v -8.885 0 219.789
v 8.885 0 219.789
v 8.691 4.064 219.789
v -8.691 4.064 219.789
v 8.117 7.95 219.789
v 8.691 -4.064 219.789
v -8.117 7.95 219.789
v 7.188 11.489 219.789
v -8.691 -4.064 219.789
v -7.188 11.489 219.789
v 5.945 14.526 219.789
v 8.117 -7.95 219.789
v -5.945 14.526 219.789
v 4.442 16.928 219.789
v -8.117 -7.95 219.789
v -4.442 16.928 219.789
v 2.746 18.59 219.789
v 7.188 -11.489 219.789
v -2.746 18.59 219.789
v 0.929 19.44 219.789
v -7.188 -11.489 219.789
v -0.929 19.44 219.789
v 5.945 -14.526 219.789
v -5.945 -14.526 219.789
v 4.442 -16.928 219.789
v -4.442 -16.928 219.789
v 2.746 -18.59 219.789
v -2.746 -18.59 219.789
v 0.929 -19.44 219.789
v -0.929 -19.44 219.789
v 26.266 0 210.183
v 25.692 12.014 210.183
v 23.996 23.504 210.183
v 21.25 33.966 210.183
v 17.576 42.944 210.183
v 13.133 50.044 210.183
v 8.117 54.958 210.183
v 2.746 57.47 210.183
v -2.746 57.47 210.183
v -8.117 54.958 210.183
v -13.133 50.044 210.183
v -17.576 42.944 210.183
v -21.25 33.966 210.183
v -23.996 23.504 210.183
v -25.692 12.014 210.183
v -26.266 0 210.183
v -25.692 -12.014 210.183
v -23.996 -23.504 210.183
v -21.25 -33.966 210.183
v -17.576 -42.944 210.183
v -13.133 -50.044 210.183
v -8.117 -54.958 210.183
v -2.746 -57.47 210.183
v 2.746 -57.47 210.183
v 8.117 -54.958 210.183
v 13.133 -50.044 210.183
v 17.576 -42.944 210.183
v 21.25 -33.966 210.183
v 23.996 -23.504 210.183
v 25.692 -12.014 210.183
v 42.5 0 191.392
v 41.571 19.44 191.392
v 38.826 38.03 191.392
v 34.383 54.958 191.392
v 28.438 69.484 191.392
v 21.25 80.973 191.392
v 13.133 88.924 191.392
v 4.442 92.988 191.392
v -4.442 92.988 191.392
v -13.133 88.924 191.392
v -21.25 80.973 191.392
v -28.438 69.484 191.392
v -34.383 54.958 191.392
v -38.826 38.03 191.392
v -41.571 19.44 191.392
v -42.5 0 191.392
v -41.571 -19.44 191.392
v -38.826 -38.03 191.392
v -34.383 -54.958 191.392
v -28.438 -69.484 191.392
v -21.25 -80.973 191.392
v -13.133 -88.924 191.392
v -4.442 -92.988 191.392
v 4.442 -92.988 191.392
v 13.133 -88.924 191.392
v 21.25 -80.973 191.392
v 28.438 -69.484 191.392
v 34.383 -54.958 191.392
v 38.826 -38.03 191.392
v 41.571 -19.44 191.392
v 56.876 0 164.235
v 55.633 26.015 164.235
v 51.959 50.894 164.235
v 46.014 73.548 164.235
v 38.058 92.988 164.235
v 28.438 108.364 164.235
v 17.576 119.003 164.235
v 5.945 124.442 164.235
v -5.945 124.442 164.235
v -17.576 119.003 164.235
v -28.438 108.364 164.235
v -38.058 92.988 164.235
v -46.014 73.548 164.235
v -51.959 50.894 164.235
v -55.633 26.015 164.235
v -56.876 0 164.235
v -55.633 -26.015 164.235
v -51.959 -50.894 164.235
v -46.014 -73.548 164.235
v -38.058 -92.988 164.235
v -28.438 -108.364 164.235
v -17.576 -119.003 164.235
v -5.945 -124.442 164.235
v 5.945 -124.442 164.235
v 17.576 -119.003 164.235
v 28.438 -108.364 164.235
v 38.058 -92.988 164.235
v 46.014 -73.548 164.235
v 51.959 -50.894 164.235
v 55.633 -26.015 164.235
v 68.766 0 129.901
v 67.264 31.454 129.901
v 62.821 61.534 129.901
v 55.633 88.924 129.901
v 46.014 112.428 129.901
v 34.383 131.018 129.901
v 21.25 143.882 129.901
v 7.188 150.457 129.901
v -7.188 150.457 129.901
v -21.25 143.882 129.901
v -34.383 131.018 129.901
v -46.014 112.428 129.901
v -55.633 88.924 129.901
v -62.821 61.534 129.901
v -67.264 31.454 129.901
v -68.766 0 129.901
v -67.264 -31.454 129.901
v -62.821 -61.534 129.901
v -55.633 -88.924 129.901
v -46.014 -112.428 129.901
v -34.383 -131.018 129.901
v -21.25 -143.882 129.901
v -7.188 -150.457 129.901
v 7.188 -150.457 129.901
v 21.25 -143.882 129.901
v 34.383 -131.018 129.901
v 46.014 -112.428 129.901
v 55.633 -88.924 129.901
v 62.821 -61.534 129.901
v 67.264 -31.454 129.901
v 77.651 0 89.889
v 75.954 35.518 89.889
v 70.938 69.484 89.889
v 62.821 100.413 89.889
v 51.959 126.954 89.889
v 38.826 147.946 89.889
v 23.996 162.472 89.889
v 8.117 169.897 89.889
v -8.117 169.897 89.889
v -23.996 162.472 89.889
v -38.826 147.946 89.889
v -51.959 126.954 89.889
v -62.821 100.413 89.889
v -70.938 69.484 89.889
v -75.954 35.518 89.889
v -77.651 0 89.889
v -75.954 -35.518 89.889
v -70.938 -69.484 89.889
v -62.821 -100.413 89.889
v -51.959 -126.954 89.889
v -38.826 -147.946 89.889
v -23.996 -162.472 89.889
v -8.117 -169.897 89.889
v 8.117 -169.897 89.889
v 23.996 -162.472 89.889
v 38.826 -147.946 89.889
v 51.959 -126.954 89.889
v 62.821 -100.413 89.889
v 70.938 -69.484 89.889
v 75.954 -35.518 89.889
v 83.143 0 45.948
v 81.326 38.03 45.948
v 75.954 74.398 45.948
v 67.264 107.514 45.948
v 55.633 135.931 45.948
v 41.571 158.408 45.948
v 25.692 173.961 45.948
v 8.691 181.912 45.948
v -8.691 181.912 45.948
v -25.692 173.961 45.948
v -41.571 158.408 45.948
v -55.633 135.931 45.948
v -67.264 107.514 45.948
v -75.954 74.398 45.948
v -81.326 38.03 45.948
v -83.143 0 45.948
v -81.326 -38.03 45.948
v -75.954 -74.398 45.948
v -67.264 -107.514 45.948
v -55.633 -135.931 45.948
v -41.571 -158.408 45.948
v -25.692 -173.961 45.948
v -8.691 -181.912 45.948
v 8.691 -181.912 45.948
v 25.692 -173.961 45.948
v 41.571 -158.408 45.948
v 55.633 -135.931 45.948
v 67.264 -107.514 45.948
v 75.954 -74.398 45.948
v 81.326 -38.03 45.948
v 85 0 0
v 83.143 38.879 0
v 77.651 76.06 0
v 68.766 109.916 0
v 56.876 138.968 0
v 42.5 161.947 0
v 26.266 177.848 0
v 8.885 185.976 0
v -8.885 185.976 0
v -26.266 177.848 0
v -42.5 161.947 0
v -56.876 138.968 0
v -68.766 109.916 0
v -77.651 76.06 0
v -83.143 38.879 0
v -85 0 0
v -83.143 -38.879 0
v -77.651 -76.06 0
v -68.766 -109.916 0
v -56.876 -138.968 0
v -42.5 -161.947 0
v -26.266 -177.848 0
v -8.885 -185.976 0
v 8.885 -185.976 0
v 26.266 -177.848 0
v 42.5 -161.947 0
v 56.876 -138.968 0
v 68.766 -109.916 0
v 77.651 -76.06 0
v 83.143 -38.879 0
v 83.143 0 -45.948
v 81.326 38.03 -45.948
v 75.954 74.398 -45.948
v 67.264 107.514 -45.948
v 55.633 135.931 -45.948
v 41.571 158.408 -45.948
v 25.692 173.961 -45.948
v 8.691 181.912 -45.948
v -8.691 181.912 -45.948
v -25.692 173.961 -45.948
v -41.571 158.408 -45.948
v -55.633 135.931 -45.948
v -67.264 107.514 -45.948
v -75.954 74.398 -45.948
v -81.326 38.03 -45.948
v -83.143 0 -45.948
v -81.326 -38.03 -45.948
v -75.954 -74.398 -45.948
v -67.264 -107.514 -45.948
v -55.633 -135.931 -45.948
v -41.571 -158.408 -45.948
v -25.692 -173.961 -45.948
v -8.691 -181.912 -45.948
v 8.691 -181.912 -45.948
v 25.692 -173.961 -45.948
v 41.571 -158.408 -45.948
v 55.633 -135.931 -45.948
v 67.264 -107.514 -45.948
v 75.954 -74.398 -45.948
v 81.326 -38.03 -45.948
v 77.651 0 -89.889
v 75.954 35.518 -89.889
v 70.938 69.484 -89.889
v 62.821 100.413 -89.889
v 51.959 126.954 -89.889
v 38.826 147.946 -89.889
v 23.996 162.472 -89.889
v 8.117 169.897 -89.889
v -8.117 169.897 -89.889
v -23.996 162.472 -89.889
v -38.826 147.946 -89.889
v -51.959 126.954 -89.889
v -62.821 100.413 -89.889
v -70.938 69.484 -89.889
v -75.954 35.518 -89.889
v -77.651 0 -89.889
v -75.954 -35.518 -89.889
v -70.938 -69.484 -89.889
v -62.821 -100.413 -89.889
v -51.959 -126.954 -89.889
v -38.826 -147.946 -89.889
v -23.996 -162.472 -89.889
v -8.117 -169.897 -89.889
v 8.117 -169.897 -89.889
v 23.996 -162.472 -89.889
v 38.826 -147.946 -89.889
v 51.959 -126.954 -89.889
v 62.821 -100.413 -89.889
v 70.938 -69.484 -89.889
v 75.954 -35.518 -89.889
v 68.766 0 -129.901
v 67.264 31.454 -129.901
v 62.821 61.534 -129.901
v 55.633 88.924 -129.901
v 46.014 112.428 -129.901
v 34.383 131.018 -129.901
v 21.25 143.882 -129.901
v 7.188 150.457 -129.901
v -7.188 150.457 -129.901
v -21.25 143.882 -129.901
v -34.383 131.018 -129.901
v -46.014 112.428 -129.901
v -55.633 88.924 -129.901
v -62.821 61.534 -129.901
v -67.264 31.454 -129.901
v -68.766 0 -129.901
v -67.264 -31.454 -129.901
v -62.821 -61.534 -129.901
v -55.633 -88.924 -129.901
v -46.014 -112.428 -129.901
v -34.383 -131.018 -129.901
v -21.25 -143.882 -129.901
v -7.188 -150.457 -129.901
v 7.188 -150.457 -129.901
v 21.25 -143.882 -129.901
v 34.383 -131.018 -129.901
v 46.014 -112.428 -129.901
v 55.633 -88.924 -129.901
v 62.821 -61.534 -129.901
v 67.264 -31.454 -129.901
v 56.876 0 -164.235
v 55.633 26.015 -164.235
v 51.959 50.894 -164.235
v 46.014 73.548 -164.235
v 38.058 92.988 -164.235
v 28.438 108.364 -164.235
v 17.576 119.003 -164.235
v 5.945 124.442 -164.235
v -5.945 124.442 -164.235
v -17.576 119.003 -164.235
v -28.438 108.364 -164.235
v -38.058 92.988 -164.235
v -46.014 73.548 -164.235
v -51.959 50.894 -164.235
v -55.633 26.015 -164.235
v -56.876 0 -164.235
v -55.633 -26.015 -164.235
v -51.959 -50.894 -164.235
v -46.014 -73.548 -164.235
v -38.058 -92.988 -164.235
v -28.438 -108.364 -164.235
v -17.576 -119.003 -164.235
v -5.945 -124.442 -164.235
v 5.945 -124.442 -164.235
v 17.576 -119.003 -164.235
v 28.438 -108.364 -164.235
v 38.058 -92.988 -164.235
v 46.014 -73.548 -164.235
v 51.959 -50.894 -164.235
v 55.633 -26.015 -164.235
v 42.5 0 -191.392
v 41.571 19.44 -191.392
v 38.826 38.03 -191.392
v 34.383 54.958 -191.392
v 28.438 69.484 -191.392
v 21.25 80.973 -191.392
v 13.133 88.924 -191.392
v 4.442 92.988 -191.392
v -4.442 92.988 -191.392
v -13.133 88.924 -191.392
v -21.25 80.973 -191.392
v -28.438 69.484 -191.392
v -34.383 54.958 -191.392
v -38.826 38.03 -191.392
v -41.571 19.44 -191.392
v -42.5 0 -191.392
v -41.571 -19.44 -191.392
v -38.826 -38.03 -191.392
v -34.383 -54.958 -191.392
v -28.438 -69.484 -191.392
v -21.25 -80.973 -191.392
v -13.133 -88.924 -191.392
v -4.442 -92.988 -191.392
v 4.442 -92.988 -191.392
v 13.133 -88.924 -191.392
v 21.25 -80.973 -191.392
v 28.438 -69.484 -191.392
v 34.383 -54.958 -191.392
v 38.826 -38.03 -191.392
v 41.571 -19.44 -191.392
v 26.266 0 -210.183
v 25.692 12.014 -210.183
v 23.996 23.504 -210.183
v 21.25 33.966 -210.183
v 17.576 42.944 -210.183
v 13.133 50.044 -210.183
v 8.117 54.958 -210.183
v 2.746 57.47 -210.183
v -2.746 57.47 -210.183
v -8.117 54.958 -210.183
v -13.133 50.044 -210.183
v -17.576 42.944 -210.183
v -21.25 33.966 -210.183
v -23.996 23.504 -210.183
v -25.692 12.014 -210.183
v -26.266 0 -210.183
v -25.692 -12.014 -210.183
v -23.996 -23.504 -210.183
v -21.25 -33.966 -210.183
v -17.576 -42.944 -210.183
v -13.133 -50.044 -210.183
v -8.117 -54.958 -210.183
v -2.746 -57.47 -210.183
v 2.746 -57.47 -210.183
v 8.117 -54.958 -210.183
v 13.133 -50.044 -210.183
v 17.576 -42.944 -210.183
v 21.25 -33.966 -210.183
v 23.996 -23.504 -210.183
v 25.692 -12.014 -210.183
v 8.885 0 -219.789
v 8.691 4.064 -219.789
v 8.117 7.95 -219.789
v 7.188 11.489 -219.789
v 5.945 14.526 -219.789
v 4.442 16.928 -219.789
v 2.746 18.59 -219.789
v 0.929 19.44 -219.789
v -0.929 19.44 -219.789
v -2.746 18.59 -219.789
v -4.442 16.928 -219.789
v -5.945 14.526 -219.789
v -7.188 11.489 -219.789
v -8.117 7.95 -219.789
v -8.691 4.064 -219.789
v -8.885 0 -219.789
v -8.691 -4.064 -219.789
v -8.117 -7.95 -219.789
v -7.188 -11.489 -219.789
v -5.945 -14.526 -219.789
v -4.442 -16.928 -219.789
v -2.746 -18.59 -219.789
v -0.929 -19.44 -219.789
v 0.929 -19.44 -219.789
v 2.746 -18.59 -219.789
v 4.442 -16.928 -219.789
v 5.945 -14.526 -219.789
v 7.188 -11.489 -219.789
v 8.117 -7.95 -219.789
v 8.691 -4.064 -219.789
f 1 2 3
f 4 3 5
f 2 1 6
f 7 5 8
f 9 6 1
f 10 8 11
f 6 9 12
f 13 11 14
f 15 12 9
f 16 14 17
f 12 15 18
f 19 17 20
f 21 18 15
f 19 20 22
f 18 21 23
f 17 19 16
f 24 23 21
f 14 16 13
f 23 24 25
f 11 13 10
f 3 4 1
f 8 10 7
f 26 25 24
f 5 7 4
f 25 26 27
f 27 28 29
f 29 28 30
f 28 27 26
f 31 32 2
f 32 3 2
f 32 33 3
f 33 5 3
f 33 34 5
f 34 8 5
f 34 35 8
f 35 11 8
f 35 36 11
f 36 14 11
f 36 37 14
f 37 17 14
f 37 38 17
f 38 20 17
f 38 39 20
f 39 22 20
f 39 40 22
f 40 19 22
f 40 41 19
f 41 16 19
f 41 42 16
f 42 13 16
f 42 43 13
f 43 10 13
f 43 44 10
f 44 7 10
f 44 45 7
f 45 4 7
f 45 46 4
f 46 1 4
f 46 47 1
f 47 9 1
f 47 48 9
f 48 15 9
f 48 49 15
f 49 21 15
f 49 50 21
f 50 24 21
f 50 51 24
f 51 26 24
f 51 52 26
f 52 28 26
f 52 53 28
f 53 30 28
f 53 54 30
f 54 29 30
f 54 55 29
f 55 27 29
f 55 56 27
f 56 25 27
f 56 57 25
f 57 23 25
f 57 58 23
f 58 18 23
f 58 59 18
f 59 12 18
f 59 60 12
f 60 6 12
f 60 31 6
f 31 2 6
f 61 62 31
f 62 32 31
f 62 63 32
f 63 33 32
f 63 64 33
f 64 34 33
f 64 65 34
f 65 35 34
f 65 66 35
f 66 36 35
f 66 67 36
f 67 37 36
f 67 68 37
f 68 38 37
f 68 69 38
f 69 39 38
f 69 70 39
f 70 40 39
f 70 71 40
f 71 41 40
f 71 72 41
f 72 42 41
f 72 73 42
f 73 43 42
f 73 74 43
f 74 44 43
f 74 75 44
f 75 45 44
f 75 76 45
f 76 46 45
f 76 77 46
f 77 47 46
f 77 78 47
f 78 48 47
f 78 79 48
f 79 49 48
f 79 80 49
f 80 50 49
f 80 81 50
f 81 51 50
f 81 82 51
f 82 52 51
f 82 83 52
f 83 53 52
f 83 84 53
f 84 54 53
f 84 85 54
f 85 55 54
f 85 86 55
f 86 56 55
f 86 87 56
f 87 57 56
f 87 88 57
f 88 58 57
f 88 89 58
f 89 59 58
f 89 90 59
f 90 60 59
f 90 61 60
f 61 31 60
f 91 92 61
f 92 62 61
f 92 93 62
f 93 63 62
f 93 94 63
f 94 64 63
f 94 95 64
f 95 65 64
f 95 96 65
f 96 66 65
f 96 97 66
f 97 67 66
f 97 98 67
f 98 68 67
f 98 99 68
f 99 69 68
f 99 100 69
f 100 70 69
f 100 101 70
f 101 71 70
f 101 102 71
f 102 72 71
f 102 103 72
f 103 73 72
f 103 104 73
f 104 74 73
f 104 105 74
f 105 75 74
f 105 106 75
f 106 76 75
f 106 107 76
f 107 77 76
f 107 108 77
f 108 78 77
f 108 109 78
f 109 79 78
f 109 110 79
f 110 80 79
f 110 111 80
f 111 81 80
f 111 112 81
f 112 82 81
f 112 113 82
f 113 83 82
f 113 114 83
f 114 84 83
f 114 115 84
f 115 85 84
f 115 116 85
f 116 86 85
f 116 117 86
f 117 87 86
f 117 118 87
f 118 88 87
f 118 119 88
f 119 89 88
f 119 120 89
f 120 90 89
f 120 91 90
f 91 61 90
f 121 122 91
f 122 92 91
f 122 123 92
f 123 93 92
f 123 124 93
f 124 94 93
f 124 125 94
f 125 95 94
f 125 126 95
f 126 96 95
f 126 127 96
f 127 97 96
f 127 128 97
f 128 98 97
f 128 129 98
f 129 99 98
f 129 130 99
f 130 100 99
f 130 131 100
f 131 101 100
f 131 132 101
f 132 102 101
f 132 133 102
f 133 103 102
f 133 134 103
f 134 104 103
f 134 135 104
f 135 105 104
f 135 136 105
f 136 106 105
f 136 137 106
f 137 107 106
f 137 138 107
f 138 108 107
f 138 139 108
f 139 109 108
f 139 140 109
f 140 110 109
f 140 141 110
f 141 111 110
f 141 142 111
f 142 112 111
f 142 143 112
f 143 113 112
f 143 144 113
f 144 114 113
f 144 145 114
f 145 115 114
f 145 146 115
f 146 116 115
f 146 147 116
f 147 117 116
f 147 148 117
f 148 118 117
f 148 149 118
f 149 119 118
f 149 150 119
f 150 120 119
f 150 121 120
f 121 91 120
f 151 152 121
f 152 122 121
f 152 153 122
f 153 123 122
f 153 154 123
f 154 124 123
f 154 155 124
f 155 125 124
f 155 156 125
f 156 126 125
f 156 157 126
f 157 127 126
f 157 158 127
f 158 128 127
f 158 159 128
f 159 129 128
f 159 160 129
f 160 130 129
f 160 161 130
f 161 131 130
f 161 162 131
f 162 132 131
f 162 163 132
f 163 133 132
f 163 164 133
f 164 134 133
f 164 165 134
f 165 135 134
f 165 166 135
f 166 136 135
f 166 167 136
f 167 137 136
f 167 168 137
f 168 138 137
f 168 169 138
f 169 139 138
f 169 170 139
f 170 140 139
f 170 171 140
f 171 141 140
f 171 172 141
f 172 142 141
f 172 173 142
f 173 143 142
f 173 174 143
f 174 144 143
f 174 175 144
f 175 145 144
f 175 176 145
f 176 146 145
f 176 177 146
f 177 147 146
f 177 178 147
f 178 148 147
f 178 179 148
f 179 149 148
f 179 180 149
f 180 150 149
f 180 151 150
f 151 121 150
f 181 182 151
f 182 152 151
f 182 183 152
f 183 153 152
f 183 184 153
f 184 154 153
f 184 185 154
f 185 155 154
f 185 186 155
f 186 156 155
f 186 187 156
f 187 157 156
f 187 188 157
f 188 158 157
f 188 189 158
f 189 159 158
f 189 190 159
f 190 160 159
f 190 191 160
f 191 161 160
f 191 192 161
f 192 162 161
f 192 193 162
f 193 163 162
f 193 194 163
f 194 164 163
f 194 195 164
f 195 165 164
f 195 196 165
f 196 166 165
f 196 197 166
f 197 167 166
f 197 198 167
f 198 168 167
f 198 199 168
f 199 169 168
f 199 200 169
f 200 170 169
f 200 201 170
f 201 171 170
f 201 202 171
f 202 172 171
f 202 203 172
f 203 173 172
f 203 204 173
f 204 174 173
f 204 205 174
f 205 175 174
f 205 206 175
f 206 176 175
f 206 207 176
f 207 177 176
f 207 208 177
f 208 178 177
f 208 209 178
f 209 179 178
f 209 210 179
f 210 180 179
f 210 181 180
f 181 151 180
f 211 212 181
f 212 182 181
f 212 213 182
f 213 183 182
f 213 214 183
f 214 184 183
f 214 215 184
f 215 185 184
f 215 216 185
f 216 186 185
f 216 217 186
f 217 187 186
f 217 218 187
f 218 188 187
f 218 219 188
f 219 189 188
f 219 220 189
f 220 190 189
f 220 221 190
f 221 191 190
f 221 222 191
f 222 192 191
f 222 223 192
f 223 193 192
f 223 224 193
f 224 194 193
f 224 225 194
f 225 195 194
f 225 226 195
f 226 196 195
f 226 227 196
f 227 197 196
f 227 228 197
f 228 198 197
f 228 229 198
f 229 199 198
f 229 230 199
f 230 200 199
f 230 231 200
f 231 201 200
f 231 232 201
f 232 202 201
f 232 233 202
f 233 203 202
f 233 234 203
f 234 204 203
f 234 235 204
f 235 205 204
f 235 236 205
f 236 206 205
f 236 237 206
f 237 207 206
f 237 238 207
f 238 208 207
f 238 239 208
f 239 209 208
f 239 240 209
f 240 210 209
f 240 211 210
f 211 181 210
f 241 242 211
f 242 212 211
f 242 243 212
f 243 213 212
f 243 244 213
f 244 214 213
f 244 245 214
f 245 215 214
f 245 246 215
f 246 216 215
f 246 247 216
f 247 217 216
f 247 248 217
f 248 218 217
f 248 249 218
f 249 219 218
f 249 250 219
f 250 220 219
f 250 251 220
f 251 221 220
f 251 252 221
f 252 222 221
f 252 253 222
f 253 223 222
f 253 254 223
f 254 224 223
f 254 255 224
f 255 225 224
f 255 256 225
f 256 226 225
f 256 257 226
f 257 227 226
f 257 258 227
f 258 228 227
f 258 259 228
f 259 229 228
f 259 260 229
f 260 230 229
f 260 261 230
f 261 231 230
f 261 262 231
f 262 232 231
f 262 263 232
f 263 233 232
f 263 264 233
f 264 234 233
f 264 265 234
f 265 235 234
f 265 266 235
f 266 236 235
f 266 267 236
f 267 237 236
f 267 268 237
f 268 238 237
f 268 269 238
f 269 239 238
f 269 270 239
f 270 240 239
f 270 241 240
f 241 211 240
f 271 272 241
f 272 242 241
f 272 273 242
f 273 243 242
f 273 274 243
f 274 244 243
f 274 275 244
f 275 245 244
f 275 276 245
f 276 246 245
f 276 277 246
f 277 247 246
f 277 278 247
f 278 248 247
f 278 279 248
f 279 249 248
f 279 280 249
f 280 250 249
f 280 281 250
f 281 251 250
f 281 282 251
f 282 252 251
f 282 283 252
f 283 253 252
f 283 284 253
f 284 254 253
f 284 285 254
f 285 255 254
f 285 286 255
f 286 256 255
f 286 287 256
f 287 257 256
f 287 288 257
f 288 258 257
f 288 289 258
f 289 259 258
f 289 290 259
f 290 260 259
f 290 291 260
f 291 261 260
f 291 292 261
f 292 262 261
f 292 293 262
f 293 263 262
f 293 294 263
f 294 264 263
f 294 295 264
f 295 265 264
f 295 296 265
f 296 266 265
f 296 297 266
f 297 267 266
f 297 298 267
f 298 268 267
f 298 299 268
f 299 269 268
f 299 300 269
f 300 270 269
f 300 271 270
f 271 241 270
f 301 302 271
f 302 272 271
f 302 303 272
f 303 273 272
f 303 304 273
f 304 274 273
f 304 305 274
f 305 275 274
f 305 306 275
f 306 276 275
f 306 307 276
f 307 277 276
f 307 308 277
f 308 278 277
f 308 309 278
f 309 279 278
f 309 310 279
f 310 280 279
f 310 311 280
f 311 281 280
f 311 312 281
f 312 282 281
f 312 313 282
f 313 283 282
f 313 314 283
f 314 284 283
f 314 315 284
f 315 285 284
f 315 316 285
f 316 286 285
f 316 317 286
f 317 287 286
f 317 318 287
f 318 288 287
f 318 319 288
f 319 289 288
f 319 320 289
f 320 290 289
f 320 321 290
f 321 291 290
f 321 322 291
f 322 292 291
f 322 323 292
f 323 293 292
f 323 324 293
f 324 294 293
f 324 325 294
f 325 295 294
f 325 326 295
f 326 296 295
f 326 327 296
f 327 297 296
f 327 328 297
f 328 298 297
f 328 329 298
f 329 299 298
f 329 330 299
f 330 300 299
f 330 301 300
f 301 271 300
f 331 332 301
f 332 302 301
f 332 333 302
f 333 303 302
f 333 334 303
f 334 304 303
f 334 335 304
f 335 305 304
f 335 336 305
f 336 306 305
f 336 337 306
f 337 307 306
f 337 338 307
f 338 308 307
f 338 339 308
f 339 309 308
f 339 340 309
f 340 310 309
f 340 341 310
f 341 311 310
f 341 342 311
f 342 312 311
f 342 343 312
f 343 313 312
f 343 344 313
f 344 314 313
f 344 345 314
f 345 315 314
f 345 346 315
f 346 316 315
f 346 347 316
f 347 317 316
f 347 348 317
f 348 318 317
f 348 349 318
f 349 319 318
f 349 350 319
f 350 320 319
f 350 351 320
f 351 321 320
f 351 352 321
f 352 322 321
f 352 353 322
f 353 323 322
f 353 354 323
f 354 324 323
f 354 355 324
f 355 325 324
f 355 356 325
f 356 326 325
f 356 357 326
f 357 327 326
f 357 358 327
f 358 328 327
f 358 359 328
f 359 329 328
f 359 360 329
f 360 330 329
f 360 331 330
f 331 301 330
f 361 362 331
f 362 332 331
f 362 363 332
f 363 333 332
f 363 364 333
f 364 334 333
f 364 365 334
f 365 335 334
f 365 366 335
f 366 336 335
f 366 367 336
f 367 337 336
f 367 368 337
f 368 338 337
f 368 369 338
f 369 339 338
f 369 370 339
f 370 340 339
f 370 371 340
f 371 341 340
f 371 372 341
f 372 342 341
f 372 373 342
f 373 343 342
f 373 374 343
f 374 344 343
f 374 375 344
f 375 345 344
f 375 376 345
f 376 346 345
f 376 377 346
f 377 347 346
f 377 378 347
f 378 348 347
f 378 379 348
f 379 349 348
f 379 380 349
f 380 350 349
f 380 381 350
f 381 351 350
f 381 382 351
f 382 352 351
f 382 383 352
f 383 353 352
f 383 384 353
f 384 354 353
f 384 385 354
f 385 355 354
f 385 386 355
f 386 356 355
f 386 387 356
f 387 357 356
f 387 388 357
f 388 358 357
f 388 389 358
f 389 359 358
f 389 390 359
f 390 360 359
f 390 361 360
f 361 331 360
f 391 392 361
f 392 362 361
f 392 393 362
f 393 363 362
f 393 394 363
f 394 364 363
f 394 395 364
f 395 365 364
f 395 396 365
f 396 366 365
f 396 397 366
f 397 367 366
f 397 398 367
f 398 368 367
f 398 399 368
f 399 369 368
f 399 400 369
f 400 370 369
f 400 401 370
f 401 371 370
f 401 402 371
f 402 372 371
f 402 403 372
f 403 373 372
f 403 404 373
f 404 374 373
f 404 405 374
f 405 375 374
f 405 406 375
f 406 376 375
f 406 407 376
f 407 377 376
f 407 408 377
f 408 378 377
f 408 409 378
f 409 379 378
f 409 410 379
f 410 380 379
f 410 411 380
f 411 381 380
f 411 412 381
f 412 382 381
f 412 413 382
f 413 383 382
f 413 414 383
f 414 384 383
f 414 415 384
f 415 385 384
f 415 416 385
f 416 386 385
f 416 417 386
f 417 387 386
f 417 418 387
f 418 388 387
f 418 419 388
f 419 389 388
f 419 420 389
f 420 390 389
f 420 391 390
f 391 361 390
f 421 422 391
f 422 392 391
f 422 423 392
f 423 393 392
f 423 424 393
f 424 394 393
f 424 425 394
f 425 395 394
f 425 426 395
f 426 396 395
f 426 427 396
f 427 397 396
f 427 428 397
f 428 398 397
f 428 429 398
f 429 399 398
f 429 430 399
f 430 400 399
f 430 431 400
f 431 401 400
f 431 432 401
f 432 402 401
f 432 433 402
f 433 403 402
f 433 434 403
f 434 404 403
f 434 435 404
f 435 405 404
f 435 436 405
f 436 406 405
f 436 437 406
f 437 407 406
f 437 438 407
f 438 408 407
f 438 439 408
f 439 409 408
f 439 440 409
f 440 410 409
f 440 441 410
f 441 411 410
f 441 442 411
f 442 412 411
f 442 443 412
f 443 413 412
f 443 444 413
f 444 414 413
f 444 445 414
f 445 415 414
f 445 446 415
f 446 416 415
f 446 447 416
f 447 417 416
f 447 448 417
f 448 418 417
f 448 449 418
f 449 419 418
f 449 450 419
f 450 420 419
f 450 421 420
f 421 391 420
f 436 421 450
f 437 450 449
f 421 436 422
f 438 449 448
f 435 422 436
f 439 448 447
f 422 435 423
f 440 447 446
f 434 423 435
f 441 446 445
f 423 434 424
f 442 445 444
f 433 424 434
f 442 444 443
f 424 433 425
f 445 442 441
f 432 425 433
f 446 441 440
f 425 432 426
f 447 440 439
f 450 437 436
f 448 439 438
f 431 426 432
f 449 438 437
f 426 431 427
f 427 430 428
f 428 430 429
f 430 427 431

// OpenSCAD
// Generated by SolidPython 1.0.1 on 2020-07-29 00:46:46


scale(v = [5, 11, 13]) {
	sphere(r = 17);
}
/***********************************************
*********      SolidPython code:      **********
************************************************
 
# import packages: SolidPython
from solid import *
from solid.utils import *
from itertools import chain, combinations, permutations


class Resize:

    def __init__(self, scad_file):
        self.scad_file = scad_file
        #self.scad_file = import_scad(scad_file)
        # cone/cylinder param:
        self.r1 = 0
        self.r2 = 0
        self.h = 0
        # rectangular prism param:
        self.w = 0
        self.l = 0
        # ellipse param:
        self.r = 0

    # import OpenScad code (file name corresponds to shape)


    # classify shape + parameters
    def assign(self, param1, param2, param3):
        if self.scad_file == 'cone.scad':
            self.r1 = param1
            self.r2 = param2
            self.h = param3
        elif self.scad_file == 'cylinder.scad':
            self.r1 = param1
            self.r2 = param2
            self.h = param3
        elif self.scad_file == 'rectangularPrism.scad':
            self.h = param1
            self.l = param2
            self.w = param3
        else:
            self.r = param1
            self.h = param2

    # resize parameters
    def iterate(self):
        x = range(3, 20, 2)
        i = 1
        if self.scad_file == 'cone.scad':
            tempList = list(permutations(x, 2))
            for temp in tempList:
                param1 = temp[0]
                param2 = temp[1]
                filepath = 'produced_scad_files/' + 'cone' + str(param1) + '_' + str(param2) + '_' + '.scad'
                scad_render_to_file(cylinder(h=param1, r1=param2, r2=0), filepath)

        elif self.scad_file == 'cylinder.scad':
            tempList = list(permutations(x, 3))
            for temp in tempList:
                param1 = temp[0]
                param2 = temp[1]
                filepath = 'produced_scad_files/' + 'cylinder' + str(param1) + '_' + str(param2) + '_' + '.scad'
                scad_render_to_file(cylinder(h=param1, r1=param2, r2=param2), filepath)

        elif self.scad_file == 'rectangularPrism.scad':
            tempList = list(permutations(x, 3))
            for temp in tempList:
                param1 = temp[0]
                param2 = temp[1]
                param3 = temp[2]
                filepath = 'produced_scad_files/' + 'rectangularPrism' + str(param1) + '_' + str(param2) + '_' + str(
                    param3) + '.scad'
                scad_render_to_file(cube(size=(param1, param2, param3)), filepath)

        elif self.scad_file == 'ellipse.scad':
            tempList = list(permutations(x, 4))
            for temp in tempList:
                param1 = temp[0]
                param2 = temp[1]
                param3 = temp[2]
                param4 = temp[3]
                filepath = 'produced_scad_files/' + 'ellipse' + str(param1) + '_' + str(param2) + '_' + str(param3) + '_' + str(param4) + '.scad'
                scad_render_to_file(scale([param1, param2, param3])(sphere(r=param4)), filepath)

    def render_to_scadfile(self):
        scad_render_to_file(scad, 'example.scad') 
 
************************************************/
